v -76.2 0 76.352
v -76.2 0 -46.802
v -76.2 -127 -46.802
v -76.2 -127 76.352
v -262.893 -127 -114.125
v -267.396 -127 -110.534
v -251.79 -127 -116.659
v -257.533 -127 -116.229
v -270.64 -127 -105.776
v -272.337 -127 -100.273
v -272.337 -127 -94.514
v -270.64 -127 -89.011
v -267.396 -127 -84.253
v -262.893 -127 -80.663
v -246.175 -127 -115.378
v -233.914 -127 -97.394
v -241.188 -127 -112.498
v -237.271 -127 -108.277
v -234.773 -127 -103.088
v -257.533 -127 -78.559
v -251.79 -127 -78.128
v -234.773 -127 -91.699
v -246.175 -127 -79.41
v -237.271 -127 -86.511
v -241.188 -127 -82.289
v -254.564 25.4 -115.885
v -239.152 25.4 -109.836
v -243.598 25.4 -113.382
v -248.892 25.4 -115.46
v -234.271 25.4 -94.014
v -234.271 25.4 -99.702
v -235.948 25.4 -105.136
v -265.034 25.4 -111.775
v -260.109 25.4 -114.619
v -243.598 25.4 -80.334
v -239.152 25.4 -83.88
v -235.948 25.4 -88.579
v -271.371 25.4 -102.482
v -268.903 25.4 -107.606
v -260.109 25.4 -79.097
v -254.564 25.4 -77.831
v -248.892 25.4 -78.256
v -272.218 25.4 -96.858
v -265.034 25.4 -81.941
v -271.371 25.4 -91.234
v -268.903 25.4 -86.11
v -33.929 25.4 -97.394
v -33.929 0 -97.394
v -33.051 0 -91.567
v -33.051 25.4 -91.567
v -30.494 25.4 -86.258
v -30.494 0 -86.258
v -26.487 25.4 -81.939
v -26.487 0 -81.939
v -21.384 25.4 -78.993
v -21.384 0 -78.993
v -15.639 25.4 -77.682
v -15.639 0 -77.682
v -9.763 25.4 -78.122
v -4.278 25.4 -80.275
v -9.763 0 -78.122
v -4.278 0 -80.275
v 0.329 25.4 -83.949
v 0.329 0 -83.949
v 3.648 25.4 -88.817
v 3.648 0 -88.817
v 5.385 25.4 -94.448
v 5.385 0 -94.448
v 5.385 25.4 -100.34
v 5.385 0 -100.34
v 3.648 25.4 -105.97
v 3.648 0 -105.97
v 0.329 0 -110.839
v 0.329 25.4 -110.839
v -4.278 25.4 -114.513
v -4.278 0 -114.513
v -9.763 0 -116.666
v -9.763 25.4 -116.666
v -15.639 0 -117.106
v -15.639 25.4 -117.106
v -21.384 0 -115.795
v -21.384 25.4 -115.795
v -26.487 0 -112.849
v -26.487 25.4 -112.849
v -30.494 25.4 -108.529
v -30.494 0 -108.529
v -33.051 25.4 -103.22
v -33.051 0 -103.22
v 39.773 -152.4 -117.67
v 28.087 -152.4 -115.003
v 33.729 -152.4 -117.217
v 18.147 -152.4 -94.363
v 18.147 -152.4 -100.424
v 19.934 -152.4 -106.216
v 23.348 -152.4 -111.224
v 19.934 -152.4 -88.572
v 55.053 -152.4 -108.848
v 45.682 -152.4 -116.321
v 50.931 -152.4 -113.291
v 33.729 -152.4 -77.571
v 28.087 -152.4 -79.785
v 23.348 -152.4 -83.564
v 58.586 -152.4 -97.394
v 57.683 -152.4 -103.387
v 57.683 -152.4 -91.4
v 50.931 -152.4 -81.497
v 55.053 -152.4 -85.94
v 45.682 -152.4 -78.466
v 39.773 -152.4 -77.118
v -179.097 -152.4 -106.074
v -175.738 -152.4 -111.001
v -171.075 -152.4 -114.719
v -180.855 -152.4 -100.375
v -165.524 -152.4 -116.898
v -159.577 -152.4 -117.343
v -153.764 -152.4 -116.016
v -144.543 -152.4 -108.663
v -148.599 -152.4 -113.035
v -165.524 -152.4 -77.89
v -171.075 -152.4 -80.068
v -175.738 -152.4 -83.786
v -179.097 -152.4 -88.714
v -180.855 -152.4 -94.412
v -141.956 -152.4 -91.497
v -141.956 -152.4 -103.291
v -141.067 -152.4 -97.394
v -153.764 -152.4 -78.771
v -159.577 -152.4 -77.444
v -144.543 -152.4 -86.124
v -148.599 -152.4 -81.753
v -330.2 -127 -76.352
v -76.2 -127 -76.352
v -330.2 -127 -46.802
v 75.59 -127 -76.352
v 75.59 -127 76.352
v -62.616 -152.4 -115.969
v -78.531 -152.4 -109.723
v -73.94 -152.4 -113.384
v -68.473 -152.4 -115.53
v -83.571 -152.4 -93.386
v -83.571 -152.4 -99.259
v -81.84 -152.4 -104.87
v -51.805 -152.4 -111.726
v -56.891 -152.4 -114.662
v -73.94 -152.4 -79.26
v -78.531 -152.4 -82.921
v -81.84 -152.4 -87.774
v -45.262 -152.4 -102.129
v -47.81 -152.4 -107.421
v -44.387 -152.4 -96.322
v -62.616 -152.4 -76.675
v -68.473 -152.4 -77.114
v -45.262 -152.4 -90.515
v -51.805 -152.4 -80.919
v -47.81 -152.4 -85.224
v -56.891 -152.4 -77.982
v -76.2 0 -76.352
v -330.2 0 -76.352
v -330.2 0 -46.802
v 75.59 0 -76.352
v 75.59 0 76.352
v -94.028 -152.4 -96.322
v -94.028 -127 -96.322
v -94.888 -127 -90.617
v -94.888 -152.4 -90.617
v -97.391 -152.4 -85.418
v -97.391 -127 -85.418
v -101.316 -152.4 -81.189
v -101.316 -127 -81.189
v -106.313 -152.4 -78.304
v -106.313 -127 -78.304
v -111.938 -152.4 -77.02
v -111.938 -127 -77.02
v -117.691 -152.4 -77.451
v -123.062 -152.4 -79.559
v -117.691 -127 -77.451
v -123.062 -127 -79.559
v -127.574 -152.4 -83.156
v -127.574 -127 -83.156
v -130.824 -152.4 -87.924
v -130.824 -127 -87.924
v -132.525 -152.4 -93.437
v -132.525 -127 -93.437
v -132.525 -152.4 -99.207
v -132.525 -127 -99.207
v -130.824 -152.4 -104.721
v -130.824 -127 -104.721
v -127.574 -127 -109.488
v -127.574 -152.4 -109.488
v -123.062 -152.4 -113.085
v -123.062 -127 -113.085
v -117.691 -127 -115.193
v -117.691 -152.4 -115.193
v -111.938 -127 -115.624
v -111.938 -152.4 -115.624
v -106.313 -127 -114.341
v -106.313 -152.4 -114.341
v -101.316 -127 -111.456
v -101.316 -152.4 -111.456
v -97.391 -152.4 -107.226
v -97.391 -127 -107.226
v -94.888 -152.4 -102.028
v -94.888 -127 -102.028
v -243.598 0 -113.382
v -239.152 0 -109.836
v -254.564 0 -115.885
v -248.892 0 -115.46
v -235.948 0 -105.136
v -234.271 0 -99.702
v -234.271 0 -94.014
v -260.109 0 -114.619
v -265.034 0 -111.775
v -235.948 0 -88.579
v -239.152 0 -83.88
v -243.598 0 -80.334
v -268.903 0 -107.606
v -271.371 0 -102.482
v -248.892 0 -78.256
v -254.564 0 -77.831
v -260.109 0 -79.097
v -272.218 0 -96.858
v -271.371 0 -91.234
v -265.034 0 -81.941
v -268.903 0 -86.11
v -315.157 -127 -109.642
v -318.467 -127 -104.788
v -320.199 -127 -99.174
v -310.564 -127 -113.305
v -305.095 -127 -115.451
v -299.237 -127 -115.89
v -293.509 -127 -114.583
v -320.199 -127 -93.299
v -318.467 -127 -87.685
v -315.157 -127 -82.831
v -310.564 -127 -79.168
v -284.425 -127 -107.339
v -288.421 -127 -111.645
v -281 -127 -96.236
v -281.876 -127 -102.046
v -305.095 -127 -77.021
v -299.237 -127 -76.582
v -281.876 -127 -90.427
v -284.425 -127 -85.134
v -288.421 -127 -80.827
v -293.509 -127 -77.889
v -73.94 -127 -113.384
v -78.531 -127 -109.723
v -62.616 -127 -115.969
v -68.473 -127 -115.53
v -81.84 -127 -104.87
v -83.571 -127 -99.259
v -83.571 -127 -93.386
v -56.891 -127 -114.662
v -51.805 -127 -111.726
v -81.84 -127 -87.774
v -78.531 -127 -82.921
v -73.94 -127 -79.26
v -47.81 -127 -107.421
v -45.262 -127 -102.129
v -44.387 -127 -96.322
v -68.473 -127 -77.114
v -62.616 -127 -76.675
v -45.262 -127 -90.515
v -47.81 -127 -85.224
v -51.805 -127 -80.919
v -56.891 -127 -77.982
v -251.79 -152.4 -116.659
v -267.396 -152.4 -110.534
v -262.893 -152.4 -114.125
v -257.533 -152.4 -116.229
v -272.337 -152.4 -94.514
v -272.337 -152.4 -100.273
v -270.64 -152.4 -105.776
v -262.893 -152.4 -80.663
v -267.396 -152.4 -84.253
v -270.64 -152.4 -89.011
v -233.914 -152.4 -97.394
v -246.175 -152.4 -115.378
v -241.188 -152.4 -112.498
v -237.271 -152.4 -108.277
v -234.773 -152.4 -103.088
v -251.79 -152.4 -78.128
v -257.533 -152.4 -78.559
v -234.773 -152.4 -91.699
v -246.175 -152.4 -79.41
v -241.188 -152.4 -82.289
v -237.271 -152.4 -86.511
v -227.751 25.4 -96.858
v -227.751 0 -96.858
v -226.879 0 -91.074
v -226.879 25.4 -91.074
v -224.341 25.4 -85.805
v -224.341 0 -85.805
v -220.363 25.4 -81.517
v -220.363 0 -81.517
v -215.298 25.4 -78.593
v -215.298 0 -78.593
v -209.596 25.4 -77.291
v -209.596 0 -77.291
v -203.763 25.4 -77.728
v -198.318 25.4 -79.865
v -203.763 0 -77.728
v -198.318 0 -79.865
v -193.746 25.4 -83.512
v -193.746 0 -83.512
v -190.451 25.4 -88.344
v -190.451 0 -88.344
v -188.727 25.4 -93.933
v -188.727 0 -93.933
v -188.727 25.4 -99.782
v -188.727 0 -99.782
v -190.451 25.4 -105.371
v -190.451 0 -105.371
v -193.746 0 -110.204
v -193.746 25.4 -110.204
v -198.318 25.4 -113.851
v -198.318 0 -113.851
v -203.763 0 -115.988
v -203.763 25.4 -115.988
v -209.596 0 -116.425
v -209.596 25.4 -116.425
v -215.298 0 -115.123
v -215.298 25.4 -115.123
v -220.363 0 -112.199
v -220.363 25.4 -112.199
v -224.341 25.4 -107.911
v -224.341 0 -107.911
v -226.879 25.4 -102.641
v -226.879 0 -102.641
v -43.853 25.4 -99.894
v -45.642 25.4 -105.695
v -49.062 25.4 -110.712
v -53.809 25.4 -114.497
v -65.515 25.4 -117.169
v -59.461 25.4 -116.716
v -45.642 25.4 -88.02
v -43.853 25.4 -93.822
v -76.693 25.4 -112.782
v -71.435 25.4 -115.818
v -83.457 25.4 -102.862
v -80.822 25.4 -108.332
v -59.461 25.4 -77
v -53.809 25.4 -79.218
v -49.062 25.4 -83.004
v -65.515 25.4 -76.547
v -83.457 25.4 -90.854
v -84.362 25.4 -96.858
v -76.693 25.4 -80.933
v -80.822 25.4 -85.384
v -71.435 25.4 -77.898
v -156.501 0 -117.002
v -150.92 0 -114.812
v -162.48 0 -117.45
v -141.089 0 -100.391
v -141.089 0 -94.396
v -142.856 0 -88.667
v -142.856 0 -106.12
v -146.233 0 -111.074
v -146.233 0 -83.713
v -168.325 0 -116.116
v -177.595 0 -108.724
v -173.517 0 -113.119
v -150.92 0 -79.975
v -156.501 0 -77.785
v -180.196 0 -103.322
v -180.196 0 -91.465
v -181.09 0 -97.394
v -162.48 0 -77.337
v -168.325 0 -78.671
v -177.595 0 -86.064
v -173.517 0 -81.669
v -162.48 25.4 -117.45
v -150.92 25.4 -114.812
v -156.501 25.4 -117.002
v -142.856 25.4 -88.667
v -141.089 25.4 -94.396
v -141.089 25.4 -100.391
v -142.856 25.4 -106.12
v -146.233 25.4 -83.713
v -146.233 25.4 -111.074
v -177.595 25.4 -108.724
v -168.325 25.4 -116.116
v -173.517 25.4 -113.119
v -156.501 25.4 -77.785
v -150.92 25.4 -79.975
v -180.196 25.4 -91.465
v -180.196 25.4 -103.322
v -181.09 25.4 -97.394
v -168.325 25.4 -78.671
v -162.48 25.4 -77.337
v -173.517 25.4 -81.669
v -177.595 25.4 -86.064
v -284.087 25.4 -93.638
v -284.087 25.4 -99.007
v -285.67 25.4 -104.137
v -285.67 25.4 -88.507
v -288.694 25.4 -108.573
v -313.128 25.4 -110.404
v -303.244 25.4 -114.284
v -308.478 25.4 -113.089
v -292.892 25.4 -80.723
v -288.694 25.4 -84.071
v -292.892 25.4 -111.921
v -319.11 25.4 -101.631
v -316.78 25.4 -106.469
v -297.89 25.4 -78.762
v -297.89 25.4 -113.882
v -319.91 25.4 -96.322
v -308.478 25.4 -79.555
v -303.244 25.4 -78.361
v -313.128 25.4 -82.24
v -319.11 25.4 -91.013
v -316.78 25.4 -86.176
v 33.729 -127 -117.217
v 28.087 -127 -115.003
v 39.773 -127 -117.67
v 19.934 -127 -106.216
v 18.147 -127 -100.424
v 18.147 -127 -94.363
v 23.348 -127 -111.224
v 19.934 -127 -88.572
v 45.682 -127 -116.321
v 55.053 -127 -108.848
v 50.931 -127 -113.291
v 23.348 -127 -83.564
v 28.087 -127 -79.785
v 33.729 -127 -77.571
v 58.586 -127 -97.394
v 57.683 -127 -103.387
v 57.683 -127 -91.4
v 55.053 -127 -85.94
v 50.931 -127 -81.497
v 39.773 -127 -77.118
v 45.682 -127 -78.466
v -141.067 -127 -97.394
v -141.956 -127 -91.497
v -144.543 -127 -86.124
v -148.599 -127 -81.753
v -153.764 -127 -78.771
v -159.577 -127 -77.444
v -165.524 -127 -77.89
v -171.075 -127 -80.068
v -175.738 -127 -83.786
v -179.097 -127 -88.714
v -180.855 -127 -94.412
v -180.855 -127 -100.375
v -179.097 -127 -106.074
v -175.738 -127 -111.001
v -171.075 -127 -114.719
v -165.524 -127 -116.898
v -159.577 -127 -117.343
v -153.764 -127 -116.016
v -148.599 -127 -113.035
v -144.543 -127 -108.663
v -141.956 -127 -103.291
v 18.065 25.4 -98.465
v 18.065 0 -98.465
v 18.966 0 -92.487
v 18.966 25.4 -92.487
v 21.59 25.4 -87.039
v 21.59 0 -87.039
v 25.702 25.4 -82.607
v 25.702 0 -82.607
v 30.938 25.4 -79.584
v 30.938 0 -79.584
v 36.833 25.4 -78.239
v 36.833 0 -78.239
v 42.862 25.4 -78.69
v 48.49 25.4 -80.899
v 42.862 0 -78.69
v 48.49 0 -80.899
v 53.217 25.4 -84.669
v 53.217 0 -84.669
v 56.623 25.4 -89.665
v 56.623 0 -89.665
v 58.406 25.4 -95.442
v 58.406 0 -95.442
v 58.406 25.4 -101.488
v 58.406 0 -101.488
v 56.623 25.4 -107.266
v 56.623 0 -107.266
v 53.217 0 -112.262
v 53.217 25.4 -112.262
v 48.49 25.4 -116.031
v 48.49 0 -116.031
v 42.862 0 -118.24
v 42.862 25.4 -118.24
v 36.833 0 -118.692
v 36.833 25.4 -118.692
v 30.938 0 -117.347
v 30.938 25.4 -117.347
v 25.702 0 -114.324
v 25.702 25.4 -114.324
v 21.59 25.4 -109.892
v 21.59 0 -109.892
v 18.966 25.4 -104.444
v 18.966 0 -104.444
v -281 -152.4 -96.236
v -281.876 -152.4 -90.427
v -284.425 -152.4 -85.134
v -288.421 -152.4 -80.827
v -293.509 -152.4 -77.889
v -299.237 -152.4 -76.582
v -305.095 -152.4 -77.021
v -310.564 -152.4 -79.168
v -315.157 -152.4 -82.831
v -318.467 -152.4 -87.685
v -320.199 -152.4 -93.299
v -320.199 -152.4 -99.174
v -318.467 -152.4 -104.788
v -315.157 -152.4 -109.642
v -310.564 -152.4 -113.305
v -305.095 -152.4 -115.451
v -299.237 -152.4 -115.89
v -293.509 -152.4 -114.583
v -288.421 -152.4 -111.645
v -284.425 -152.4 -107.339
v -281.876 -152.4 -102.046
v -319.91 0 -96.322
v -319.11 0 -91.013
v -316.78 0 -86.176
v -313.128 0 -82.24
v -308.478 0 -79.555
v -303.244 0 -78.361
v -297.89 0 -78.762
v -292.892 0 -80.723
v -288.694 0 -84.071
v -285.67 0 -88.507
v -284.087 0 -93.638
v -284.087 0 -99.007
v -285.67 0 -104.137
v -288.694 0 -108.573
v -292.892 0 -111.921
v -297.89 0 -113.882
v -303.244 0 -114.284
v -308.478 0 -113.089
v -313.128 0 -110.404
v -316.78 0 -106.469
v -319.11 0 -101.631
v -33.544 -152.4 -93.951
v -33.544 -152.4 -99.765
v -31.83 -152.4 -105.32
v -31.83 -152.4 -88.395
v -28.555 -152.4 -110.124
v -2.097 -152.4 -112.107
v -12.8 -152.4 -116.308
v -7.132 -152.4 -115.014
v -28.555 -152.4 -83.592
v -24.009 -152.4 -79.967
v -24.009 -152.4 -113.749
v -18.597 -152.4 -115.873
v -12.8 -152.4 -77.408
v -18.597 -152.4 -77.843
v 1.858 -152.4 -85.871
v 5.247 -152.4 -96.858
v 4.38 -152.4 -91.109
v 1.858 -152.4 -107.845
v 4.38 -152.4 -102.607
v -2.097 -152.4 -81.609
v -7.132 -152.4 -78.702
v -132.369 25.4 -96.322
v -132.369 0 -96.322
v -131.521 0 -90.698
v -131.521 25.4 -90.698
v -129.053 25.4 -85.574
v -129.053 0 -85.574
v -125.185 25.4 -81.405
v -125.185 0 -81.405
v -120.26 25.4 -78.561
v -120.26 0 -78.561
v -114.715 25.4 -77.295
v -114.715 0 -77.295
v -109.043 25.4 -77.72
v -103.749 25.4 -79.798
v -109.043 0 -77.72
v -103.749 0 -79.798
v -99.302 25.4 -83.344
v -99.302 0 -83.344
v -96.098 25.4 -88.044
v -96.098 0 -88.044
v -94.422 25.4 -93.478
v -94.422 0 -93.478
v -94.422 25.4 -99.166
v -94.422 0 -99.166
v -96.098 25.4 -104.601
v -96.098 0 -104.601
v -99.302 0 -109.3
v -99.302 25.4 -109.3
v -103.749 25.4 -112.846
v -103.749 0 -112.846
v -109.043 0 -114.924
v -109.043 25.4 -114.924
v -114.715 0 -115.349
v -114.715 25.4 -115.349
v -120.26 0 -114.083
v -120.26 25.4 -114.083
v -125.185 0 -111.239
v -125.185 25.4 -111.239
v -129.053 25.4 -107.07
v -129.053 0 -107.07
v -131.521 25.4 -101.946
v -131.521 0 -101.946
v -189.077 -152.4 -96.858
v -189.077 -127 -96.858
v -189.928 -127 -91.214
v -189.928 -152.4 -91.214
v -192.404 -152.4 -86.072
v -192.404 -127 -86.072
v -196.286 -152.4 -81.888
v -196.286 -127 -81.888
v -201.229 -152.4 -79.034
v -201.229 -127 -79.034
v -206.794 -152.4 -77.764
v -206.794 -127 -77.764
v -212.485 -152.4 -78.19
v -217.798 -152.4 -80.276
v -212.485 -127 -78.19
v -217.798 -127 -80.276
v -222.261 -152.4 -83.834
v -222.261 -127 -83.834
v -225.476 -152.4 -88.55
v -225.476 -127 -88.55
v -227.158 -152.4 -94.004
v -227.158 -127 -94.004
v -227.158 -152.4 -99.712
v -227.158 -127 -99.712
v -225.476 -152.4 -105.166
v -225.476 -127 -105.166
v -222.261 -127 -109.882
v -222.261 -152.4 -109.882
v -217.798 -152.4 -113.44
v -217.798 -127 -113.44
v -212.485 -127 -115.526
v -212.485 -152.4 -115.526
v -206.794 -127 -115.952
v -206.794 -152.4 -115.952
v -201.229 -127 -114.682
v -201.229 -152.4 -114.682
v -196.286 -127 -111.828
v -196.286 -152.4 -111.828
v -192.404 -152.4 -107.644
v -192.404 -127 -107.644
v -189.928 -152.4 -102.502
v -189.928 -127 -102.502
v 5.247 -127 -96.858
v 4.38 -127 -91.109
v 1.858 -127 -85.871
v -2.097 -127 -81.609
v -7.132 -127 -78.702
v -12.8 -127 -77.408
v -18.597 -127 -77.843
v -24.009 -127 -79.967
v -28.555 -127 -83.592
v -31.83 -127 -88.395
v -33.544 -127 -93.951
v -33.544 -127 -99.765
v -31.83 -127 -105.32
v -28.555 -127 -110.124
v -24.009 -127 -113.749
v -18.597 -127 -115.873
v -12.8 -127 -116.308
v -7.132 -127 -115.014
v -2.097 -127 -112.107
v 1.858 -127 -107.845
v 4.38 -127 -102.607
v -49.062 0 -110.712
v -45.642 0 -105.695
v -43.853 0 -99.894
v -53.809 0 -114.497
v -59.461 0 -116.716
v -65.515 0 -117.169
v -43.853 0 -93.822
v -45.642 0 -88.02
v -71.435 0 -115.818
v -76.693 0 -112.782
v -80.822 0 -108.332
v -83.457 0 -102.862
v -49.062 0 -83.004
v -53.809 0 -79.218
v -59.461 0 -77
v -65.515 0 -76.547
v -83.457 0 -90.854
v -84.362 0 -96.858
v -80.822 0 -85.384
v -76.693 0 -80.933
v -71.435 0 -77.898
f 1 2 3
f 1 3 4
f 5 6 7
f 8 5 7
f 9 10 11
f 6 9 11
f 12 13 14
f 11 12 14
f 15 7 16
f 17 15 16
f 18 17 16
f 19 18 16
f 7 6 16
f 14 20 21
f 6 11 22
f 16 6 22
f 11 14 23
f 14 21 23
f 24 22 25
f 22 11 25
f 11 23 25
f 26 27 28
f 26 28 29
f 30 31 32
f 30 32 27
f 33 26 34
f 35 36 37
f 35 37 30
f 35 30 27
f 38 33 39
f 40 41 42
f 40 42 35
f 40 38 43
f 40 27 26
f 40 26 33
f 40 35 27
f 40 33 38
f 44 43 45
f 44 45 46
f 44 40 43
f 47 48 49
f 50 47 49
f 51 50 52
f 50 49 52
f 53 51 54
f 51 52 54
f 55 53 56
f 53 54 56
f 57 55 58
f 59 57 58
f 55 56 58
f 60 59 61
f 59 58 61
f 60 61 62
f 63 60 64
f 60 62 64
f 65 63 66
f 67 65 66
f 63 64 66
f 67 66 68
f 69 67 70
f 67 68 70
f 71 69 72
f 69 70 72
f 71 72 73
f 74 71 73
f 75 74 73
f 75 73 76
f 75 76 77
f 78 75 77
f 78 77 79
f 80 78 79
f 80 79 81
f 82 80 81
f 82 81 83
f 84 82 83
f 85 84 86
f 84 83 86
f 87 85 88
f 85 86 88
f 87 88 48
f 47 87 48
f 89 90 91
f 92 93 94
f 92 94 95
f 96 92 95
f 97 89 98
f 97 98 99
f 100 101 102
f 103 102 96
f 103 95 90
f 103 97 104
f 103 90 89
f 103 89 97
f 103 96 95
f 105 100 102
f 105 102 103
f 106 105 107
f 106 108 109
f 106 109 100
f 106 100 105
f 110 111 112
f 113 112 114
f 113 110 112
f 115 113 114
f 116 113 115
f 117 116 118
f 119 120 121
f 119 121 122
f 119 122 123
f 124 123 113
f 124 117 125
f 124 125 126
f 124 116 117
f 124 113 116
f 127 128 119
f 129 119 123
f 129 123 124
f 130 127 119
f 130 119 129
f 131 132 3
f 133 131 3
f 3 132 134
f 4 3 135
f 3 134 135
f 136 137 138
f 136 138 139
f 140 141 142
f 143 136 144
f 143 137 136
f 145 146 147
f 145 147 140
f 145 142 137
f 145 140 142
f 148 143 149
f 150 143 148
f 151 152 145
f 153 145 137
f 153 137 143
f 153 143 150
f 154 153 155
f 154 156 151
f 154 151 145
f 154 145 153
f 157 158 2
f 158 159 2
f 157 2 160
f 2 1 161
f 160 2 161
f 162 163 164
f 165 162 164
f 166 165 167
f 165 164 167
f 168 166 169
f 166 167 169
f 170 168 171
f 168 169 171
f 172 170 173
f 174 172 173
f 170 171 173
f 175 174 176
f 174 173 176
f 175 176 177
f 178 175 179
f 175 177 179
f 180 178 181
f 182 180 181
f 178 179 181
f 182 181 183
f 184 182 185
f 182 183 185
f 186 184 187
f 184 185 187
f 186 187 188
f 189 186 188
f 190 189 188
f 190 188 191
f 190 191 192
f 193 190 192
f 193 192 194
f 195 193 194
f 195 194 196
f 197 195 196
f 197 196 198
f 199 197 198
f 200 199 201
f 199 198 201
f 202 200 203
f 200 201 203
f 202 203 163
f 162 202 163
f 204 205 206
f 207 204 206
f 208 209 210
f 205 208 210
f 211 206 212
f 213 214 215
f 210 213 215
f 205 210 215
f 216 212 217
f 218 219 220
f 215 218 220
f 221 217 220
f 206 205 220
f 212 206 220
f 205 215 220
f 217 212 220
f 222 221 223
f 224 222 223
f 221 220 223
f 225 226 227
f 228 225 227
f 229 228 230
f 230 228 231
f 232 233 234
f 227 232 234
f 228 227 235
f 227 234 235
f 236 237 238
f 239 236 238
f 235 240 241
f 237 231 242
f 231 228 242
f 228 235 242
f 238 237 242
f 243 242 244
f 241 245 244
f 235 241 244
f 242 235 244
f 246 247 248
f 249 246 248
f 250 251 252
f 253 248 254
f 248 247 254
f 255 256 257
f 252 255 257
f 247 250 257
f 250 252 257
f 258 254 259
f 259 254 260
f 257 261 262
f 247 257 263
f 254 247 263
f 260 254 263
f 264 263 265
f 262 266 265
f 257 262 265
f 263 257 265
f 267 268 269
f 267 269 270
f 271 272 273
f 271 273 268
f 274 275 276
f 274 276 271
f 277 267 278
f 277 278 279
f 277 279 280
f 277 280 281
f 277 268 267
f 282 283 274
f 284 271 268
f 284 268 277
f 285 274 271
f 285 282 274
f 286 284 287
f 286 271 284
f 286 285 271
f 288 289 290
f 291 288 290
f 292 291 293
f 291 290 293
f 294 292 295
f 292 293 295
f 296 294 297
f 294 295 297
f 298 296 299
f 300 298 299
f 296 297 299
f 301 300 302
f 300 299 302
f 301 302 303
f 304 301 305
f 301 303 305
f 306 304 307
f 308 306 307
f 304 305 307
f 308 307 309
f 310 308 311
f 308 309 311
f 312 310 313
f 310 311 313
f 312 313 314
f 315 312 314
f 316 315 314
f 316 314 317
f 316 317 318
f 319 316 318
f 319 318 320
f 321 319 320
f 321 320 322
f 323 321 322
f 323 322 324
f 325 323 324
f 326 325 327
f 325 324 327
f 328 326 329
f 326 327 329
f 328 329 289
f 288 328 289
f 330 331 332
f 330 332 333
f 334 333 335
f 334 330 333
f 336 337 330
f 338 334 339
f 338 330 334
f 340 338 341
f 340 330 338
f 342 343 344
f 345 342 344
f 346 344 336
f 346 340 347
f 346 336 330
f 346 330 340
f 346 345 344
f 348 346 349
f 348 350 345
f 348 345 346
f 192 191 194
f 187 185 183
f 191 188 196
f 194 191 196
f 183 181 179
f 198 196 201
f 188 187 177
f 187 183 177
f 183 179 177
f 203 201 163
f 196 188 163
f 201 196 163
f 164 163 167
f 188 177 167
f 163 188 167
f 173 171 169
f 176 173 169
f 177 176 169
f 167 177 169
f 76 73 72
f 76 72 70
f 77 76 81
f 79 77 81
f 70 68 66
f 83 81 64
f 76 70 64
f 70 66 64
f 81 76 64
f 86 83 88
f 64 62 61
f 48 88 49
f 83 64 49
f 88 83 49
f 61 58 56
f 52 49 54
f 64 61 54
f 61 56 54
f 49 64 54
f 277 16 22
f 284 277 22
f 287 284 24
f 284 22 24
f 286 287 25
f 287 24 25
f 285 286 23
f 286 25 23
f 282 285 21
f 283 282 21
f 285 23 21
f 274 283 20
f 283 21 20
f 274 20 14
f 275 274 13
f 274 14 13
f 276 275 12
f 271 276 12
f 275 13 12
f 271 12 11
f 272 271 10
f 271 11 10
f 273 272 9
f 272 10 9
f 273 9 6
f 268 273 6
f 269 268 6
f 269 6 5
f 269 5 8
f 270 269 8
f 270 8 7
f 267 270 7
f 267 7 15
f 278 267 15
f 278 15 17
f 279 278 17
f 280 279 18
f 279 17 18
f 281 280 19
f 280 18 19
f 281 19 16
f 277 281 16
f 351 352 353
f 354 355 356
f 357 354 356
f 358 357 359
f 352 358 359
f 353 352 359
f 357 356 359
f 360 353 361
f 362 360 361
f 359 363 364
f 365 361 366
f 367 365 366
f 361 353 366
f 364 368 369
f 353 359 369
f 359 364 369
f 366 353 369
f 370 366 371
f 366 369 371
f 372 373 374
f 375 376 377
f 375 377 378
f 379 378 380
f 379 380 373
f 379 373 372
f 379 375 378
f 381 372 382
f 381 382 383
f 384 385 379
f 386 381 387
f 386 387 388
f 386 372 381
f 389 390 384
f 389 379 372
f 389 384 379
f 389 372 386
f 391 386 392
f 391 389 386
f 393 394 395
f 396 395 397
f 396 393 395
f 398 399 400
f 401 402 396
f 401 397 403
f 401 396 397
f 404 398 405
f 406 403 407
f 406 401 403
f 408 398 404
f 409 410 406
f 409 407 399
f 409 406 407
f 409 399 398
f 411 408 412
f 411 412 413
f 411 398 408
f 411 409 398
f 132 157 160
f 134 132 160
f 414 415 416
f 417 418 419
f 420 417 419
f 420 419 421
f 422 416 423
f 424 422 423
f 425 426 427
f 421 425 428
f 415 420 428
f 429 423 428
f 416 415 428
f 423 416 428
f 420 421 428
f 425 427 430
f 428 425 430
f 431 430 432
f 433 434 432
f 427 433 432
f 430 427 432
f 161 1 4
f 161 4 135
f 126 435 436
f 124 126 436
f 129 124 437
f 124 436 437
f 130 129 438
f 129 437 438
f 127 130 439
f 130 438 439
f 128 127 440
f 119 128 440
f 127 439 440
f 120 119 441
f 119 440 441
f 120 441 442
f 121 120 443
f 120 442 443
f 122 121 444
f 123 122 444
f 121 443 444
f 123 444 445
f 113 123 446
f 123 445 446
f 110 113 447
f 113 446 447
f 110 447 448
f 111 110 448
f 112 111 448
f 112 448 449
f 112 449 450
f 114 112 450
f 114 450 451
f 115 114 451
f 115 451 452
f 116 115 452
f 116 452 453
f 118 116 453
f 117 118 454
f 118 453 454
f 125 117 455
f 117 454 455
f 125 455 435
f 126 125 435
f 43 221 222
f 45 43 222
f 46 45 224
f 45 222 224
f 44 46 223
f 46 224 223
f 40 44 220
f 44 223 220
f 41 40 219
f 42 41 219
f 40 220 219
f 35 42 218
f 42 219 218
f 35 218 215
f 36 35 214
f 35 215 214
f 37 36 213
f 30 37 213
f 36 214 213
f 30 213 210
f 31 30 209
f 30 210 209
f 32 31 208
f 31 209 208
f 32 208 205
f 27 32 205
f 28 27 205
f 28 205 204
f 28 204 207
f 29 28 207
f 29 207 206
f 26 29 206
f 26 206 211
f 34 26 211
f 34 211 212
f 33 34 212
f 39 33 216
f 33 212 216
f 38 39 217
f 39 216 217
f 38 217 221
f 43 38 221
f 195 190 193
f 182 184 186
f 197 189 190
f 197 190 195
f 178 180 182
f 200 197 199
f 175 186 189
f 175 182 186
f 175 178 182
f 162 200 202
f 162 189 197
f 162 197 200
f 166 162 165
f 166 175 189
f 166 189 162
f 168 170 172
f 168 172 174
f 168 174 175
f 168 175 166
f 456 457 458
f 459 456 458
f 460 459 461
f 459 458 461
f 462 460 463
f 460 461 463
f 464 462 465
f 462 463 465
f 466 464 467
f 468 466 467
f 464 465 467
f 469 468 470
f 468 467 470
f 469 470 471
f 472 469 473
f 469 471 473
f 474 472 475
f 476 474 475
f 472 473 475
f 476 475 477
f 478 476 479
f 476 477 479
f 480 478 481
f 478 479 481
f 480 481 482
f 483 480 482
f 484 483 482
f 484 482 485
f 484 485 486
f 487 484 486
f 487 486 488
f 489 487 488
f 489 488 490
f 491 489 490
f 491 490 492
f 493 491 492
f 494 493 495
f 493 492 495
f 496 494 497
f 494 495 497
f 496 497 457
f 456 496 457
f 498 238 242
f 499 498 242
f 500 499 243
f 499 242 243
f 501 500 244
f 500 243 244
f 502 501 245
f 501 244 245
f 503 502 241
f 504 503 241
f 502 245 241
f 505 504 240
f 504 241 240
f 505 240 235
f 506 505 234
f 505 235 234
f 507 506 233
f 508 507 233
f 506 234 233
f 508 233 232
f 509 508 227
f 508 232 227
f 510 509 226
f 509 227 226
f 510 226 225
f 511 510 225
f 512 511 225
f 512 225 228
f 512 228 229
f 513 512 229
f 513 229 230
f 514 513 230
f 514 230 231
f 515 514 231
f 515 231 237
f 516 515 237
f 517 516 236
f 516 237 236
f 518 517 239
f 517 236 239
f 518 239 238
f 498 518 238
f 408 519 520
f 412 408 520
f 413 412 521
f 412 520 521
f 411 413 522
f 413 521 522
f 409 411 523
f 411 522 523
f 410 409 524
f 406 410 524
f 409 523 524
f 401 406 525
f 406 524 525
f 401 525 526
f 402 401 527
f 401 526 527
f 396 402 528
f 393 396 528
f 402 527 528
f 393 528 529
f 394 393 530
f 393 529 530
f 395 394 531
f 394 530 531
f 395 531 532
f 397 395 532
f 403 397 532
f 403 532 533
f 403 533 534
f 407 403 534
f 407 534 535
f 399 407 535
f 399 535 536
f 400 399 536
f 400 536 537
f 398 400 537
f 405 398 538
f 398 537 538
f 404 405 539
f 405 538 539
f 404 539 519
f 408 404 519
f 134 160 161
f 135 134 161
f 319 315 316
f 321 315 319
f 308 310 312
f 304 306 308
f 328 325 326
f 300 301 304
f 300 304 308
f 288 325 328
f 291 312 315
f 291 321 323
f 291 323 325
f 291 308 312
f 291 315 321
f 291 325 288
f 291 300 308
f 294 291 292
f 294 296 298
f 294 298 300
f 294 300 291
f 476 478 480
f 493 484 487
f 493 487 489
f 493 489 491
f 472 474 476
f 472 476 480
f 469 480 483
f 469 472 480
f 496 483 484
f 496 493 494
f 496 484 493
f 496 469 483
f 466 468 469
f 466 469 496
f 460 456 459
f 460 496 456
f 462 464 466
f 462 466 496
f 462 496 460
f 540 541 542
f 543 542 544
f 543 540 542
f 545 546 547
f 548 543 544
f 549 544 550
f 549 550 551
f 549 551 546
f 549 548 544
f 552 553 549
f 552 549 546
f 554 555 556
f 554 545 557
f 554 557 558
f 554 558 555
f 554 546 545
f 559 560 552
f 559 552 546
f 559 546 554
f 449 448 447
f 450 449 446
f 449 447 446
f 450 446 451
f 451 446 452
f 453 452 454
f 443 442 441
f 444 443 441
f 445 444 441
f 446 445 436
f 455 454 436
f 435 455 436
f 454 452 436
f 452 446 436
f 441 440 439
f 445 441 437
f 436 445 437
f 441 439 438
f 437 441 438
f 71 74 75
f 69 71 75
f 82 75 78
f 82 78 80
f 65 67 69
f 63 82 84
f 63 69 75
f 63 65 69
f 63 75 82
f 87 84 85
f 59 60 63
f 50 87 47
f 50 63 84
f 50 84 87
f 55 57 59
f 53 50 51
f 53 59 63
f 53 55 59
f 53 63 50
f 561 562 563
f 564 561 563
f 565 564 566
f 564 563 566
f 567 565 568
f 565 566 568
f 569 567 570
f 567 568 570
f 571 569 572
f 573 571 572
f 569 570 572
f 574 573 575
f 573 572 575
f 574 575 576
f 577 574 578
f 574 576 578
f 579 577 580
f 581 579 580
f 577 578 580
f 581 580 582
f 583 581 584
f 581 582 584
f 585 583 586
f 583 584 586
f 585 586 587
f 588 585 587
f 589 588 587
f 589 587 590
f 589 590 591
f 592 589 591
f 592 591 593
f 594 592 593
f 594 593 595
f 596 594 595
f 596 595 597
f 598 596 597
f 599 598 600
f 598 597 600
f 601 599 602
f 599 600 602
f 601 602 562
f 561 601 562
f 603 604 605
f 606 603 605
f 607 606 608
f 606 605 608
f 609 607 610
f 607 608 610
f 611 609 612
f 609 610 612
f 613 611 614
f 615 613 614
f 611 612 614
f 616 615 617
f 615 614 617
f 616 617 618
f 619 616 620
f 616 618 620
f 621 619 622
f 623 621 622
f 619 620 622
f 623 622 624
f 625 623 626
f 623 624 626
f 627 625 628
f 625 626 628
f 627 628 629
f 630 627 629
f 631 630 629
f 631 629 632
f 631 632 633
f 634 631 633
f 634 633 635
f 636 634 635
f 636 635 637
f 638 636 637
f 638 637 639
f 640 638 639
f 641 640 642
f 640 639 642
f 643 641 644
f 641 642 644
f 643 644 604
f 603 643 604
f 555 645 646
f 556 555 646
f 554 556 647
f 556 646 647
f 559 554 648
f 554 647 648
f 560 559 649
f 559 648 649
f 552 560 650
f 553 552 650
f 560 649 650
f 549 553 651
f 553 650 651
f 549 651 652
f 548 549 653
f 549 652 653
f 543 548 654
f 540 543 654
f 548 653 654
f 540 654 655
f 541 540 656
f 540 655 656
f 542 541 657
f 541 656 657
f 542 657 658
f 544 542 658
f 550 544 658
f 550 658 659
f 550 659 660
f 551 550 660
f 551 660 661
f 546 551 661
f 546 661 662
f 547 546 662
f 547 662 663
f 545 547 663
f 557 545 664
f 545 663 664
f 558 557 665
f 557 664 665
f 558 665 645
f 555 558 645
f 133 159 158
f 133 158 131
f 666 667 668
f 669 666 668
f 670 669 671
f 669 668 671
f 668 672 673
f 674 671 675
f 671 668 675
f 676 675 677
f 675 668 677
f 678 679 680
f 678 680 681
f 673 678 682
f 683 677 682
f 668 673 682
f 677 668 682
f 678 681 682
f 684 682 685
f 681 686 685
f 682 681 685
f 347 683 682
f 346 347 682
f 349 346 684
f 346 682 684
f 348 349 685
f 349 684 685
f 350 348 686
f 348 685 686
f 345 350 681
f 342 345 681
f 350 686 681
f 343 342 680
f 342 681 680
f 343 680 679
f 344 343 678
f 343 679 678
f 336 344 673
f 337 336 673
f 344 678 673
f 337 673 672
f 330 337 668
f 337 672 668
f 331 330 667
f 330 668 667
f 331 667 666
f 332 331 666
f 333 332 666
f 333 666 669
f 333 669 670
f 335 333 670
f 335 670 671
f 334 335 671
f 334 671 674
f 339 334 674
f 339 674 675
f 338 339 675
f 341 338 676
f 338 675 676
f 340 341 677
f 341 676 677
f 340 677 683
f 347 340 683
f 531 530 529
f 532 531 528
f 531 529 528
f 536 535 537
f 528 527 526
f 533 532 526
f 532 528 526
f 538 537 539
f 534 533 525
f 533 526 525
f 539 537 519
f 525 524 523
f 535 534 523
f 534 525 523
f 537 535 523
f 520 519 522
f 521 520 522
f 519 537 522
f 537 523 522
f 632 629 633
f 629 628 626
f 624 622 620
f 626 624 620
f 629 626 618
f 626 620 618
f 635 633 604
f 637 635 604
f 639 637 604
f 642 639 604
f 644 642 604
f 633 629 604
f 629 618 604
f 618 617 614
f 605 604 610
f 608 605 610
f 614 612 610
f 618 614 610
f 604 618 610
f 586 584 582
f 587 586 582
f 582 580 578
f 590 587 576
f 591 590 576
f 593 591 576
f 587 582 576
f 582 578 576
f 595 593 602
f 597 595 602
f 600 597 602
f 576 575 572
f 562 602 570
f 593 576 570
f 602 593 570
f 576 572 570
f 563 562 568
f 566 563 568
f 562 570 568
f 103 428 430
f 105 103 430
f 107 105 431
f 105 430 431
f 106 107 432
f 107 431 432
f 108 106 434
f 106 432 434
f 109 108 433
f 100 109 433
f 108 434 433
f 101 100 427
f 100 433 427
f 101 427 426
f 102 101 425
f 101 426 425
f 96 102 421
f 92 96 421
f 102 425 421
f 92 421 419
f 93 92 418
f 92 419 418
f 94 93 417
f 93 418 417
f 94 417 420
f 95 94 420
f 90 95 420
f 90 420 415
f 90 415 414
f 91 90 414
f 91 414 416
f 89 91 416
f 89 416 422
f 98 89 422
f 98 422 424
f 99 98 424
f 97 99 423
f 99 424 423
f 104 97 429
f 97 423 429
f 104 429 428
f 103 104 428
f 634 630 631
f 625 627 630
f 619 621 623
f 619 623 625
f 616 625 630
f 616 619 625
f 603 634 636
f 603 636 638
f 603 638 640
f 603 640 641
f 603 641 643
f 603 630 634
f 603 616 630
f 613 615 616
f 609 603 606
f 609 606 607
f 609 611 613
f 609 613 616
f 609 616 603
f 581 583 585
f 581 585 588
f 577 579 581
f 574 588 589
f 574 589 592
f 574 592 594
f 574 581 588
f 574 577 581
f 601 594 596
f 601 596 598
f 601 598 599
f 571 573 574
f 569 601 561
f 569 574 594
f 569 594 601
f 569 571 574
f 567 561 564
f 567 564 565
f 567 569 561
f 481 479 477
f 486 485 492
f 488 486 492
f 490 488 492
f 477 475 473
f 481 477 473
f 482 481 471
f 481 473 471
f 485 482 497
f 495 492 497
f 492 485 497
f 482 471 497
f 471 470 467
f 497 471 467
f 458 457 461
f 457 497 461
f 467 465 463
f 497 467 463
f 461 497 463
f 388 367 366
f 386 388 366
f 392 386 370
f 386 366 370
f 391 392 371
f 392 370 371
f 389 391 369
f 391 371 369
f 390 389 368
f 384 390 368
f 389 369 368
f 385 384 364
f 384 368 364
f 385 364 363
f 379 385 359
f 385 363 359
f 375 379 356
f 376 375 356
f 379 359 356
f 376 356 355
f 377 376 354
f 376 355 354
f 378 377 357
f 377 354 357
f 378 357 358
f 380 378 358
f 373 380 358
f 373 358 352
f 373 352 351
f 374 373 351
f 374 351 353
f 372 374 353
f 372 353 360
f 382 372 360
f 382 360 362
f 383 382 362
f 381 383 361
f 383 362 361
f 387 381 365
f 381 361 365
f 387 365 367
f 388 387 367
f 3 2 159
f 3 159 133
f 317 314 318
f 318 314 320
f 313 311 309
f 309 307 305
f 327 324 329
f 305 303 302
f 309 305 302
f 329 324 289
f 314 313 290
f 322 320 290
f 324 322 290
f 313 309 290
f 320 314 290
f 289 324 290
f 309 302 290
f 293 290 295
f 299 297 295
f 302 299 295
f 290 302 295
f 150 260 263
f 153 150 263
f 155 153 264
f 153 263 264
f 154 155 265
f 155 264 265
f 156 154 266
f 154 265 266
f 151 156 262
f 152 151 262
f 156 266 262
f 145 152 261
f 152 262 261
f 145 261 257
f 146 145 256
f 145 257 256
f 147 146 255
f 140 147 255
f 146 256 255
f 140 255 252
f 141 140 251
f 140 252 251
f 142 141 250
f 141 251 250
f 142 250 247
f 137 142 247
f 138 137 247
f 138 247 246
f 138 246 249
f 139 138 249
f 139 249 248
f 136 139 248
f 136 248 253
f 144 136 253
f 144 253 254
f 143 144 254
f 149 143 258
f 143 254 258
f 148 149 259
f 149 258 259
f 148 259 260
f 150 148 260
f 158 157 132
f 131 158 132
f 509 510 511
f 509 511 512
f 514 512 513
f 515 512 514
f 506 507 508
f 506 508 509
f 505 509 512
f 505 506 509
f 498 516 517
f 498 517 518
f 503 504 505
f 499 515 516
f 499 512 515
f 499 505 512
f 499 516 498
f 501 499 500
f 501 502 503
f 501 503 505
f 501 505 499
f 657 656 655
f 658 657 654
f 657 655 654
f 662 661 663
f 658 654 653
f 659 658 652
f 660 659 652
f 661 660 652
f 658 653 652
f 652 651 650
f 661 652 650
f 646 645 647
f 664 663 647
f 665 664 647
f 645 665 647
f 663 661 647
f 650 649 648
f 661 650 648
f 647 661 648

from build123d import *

# Parameters (mm, degrees)
F0_W     = 151.790403
F0_H     = 152.704806
F1_DEPTH = 127
F2_W     = 127
F2_H     = 29.550035
F3_DEPTH = 254
F4_R     = 19.709165
F6_DEPTH = 25.4
F5_R     = 19.319298
F5_R_2   = 19.147645
F5_R_3   = 20.0056
F5_R_4   = 19.35643
F5_R_5   = 19.701903
F5_R_6   = 19.504186
F5_R_7   = 20.333005
F7_DEPTH = 25.4
F8_R     = 20.283501
F8_R_2   = 19.767375
F8_R_3   = 20.368262
F8_R_4   = 19.080044
F8_R_5   = 20.112936
F8_R_6   = 19.6216
F8_R_7   = 19.080042
F8_R_8   = 18.011877
F9_DEPTH = 25.4


with BuildPart() as f1:
    # F0 (on Front) → F1 (new body)
    with BuildSketch(Plane.XZ):
        with Locations((-0.3048, 0)):
            Rectangle(F0_W, F0_H)
    extrude(amount=F1_DEPTH)

    # F2 (on face) → F3 (join)
    with BuildSketch(Plane(origin=(-76.200001, 0, 0), x_dir=(0, -1, 0), z_dir=(-1, 0, 0))):
        with Locations((63.5, -61.577385)):
            Rectangle(F2_W, F2_H)
    extrude(amount=F3_DEPTH)


with BuildPart() as f6:
    # F4 (on face) → F6 (new body)
    with BuildSketch(Plane.XZ.offset(127)):
        with Locations((-300.709605, -96.236154)):
            Circle(F4_R)
    extrude(amount=F6_DEPTH)


with BuildPart() as f7:
    # F5 (on face) → F7 (new body)
    with BuildSketch(Plane.XZ.offset(127)):
        with Locations((-253.233612, -97.393751)):
            Circle(F5_R)
        with Locations((-208.224639, -96.857928)):
            Circle(F5_R_2)
        with Locations((-161.072373, -97.393751)):
            Circle(F5_R_3)
        with Locations((-113.384277, -96.322112)):
            Circle(F5_R_4)
        with Locations((-64.088717, -96.322112)):
            Circle(F5_R_5)
        with Locations((-14.257341, -96.857928)):
            Circle(F5_R_6)
        with Locations((38.253129, -97.393751)):
            Circle(F5_R_7)
    extrude(amount=F7_DEPTH)


with BuildPart() as f9:
    # F8 (on face) → F9 (new body)
    with BuildSketch(Plane(origin=(0, 0, 0), x_dir=(-1, 0, 0), z_dir=(0, 1, 0))):
        with Locations((-38.348585, -98.465398)):
            Circle(F8_R)
        with Locations((14.16189, -97.393751)):
            Circle(F8_R_2)
        with Locations((63.993268, -96.857928)):
            Circle(F8_R_3)
        with Locations((113.288827, -96.322112)):
            Circle(F8_R_4)
        with Locations((160.976917, -97.393751)):
            Circle(F8_R_5)
        with Locations((208.129182, -96.857928)):
            Circle(F8_R_6)
        with Locations((253.138185, -96.857928)):
            Circle(F8_R_7)
        with Locations((301.897913, -96.322112)):
            Circle(F8_R_8)
    extrude(amount=F9_DEPTH)


solid = Compound([f1.part, f6.part, f7.part, f9.part])
